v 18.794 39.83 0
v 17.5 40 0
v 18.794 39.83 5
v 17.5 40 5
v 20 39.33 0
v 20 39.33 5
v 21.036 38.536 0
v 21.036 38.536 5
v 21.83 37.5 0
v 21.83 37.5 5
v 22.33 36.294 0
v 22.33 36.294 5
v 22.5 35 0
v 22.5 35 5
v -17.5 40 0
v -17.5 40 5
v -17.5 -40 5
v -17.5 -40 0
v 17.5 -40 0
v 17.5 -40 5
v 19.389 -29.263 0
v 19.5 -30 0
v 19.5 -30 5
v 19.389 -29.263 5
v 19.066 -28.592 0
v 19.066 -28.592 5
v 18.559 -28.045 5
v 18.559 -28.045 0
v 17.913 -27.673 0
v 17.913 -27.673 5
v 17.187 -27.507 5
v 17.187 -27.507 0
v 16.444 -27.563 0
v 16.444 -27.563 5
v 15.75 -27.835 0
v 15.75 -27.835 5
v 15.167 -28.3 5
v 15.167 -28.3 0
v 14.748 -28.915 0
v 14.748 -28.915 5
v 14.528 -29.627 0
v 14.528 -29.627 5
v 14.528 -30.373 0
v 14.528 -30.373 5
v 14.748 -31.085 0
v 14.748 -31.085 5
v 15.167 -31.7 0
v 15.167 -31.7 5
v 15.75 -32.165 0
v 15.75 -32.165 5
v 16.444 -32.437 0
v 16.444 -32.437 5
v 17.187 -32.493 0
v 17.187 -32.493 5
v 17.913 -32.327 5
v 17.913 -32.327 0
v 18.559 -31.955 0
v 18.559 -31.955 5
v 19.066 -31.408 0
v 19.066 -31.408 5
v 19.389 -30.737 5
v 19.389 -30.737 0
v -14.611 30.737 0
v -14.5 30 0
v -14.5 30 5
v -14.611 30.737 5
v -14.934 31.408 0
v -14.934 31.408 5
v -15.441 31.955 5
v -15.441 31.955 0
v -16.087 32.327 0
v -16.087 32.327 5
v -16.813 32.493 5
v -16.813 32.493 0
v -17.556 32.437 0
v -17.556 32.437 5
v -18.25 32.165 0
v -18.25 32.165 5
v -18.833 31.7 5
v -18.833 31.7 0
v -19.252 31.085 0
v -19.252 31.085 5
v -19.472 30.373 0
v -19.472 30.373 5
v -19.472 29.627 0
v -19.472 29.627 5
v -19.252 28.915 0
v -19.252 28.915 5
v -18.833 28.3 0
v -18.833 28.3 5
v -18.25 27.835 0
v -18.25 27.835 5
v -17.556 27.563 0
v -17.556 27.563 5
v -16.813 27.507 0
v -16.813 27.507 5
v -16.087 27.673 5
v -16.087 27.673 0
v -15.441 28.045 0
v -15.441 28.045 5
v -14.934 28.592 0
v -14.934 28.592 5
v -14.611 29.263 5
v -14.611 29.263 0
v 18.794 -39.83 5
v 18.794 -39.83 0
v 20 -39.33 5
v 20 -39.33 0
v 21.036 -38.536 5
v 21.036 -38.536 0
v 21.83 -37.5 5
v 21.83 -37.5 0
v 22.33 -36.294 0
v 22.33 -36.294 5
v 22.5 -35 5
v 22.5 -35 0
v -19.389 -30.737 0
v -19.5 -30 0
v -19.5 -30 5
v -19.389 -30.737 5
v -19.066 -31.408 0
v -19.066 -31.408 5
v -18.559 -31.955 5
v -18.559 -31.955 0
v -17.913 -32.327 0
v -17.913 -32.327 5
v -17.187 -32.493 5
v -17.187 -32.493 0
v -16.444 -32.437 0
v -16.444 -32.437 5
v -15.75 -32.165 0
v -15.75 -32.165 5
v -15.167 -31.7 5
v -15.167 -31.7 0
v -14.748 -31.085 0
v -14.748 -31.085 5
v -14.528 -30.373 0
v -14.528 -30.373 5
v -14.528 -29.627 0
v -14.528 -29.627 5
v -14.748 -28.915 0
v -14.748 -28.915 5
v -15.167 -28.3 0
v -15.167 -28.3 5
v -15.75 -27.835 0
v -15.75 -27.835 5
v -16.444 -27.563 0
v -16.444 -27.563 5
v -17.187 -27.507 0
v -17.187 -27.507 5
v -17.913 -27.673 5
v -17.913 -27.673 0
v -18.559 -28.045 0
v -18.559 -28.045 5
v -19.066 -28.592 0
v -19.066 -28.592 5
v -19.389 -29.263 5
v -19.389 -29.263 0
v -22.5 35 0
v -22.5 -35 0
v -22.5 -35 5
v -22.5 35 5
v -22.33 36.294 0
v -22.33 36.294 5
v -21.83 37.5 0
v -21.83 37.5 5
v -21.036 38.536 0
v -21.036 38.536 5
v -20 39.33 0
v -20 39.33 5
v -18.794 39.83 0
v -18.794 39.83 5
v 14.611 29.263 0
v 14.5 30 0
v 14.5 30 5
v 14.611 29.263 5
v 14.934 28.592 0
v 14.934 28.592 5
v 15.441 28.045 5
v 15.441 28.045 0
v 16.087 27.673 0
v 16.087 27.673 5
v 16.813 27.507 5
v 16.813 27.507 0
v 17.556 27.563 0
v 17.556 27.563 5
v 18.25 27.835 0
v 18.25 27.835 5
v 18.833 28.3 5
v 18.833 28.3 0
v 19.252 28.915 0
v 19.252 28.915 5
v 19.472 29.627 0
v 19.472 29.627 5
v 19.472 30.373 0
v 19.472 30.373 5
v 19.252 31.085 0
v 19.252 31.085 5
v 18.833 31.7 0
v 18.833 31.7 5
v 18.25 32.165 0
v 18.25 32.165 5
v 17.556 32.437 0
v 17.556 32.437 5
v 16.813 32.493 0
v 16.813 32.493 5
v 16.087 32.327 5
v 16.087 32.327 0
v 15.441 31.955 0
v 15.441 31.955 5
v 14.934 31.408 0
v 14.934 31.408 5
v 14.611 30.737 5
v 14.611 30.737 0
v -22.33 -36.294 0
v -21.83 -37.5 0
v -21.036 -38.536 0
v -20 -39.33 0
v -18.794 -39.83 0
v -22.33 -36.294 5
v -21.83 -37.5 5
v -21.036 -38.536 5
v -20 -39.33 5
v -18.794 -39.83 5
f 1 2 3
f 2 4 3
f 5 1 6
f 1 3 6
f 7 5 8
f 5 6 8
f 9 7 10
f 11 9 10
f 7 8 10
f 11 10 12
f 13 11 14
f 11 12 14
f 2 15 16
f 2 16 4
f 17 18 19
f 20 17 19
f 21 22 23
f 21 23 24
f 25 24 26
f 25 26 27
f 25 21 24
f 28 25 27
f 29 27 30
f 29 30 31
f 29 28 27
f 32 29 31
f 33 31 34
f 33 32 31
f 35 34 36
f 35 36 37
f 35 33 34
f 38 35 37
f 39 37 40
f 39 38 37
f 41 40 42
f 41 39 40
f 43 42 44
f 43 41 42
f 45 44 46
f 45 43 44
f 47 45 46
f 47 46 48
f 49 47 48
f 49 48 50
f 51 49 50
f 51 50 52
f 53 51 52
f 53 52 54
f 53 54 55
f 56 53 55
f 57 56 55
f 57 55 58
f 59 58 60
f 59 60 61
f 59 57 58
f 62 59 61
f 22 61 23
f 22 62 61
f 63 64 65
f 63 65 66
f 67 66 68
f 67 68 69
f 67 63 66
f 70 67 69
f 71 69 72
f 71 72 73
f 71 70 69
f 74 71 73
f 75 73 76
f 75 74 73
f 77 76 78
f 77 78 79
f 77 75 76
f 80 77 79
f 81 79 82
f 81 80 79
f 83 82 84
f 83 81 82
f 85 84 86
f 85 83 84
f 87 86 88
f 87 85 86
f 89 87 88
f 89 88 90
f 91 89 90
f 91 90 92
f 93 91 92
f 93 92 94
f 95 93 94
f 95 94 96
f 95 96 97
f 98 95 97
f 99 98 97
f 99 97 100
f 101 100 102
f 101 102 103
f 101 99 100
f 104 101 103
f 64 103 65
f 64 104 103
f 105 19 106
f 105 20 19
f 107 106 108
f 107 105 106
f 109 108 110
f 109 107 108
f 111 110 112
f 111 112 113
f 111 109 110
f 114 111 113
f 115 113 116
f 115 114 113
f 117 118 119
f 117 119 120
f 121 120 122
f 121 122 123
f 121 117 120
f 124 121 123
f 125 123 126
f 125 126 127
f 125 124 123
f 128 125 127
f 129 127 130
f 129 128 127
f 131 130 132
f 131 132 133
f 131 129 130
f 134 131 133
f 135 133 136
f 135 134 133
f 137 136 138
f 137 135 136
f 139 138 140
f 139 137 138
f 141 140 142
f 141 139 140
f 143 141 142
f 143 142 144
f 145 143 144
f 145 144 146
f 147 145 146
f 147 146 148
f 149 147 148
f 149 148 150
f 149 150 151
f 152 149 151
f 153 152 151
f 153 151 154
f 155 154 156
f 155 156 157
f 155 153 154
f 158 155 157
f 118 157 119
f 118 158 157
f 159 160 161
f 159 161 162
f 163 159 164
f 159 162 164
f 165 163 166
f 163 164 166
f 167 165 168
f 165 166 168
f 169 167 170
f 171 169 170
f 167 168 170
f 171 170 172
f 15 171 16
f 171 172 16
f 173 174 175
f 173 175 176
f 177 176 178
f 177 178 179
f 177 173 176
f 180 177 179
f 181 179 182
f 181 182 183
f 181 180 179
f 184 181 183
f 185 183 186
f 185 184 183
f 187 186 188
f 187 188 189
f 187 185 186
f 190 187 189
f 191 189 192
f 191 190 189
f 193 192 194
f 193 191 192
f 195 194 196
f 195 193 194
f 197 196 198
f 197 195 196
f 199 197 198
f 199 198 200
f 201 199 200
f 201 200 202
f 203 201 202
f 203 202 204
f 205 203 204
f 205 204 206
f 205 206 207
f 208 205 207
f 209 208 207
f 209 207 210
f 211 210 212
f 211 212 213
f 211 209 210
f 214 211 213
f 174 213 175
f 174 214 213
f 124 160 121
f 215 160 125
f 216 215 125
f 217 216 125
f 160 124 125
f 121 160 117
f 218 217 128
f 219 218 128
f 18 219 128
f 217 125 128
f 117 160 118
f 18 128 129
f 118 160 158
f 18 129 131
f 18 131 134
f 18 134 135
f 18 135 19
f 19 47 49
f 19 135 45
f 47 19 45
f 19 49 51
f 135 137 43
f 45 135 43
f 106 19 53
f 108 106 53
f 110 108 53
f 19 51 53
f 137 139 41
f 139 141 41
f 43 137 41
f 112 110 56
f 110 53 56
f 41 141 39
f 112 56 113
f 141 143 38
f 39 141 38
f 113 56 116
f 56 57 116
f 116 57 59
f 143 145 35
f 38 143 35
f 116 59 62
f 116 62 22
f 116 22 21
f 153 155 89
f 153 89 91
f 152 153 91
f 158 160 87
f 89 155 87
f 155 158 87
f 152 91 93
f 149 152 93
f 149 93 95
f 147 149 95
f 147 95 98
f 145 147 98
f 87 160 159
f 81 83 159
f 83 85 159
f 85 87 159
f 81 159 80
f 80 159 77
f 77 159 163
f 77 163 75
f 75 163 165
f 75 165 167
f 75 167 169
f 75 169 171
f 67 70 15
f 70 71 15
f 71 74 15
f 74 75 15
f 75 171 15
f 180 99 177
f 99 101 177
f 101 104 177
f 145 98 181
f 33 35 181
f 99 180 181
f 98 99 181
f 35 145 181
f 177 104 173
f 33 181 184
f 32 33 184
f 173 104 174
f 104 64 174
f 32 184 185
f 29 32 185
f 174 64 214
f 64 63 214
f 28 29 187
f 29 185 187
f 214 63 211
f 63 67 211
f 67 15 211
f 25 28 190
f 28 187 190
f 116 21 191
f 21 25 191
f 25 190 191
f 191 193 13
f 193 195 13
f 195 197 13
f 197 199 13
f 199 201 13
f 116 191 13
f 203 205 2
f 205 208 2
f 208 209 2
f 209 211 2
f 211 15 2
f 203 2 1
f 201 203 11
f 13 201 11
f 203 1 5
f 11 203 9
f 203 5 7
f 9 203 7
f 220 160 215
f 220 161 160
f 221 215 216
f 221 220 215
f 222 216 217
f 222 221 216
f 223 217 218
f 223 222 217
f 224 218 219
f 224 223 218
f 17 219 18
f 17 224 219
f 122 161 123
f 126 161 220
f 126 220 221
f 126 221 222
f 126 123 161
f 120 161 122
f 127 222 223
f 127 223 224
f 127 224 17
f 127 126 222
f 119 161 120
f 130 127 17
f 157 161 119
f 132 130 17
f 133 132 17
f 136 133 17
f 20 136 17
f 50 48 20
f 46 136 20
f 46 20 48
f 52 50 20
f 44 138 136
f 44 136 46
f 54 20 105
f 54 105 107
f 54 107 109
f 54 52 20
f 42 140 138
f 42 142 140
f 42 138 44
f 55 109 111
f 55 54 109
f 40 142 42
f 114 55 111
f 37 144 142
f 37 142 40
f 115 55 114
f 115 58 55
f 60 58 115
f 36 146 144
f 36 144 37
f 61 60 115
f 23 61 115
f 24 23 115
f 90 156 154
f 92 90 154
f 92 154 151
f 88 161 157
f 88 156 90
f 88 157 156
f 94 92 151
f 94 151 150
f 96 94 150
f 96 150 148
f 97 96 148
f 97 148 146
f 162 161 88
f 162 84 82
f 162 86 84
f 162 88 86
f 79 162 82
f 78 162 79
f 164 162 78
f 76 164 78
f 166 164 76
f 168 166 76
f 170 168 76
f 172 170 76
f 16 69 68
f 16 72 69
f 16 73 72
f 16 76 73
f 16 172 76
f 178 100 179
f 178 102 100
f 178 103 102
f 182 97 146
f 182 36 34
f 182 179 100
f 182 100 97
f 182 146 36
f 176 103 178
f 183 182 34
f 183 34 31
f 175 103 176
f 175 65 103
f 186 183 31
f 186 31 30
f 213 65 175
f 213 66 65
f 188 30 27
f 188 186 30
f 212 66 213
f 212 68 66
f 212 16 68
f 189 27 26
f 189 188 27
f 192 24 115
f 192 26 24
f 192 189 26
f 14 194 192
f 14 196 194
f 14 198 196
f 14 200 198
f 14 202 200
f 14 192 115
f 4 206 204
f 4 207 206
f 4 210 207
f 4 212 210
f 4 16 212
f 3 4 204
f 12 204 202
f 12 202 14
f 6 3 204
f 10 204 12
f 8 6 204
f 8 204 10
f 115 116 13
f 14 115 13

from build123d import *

# Parameters (mm, degrees)
ESQUISSE1_W        = 45
ESQUISSE1_H        = 80
ESQUISSE1_R        = 2.5
BOSS_EXTRU_1_DEPTH = 5
CONG_1_R           = 5


with BuildPart() as part:
    # Esquisse1 → Boss.-Extru.1 (new body)
    with BuildSketch(Plane.XY):
        Rectangle(ESQUISSE1_W, ESQUISSE1_H)
        with Locations((-17, 30)):
            Circle(ESQUISSE1_R, mode=Mode.SUBTRACT)
        with Locations(Location((-17, -30, 0), (0, 0, 180))):
            Circle(ESQUISSE1_R, mode=Mode.SUBTRACT)
        with Locations((17, -30)):
            Circle(ESQUISSE1_R, mode=Mode.SUBTRACT)
        with Locations(Location((17, 30, 0), (0, 0, 180))):
            Circle(ESQUISSE1_R, mode=Mode.SUBTRACT)
    extrude(amount=BOSS_EXTRU_1_DEPTH)

    # Congé1
    cong_1_edges = [part.edges().sort_by_distance(p)[0] for p in [
        (22.5, -40, 2.5),
        (-22.5, -40, 2.5),
        (-22.5, 40, 2.5),
        (22.5, 40, 2.5),
    ]]
    fillet(cong_1_edges, radius=CONG_1_R)


solid = part.part
